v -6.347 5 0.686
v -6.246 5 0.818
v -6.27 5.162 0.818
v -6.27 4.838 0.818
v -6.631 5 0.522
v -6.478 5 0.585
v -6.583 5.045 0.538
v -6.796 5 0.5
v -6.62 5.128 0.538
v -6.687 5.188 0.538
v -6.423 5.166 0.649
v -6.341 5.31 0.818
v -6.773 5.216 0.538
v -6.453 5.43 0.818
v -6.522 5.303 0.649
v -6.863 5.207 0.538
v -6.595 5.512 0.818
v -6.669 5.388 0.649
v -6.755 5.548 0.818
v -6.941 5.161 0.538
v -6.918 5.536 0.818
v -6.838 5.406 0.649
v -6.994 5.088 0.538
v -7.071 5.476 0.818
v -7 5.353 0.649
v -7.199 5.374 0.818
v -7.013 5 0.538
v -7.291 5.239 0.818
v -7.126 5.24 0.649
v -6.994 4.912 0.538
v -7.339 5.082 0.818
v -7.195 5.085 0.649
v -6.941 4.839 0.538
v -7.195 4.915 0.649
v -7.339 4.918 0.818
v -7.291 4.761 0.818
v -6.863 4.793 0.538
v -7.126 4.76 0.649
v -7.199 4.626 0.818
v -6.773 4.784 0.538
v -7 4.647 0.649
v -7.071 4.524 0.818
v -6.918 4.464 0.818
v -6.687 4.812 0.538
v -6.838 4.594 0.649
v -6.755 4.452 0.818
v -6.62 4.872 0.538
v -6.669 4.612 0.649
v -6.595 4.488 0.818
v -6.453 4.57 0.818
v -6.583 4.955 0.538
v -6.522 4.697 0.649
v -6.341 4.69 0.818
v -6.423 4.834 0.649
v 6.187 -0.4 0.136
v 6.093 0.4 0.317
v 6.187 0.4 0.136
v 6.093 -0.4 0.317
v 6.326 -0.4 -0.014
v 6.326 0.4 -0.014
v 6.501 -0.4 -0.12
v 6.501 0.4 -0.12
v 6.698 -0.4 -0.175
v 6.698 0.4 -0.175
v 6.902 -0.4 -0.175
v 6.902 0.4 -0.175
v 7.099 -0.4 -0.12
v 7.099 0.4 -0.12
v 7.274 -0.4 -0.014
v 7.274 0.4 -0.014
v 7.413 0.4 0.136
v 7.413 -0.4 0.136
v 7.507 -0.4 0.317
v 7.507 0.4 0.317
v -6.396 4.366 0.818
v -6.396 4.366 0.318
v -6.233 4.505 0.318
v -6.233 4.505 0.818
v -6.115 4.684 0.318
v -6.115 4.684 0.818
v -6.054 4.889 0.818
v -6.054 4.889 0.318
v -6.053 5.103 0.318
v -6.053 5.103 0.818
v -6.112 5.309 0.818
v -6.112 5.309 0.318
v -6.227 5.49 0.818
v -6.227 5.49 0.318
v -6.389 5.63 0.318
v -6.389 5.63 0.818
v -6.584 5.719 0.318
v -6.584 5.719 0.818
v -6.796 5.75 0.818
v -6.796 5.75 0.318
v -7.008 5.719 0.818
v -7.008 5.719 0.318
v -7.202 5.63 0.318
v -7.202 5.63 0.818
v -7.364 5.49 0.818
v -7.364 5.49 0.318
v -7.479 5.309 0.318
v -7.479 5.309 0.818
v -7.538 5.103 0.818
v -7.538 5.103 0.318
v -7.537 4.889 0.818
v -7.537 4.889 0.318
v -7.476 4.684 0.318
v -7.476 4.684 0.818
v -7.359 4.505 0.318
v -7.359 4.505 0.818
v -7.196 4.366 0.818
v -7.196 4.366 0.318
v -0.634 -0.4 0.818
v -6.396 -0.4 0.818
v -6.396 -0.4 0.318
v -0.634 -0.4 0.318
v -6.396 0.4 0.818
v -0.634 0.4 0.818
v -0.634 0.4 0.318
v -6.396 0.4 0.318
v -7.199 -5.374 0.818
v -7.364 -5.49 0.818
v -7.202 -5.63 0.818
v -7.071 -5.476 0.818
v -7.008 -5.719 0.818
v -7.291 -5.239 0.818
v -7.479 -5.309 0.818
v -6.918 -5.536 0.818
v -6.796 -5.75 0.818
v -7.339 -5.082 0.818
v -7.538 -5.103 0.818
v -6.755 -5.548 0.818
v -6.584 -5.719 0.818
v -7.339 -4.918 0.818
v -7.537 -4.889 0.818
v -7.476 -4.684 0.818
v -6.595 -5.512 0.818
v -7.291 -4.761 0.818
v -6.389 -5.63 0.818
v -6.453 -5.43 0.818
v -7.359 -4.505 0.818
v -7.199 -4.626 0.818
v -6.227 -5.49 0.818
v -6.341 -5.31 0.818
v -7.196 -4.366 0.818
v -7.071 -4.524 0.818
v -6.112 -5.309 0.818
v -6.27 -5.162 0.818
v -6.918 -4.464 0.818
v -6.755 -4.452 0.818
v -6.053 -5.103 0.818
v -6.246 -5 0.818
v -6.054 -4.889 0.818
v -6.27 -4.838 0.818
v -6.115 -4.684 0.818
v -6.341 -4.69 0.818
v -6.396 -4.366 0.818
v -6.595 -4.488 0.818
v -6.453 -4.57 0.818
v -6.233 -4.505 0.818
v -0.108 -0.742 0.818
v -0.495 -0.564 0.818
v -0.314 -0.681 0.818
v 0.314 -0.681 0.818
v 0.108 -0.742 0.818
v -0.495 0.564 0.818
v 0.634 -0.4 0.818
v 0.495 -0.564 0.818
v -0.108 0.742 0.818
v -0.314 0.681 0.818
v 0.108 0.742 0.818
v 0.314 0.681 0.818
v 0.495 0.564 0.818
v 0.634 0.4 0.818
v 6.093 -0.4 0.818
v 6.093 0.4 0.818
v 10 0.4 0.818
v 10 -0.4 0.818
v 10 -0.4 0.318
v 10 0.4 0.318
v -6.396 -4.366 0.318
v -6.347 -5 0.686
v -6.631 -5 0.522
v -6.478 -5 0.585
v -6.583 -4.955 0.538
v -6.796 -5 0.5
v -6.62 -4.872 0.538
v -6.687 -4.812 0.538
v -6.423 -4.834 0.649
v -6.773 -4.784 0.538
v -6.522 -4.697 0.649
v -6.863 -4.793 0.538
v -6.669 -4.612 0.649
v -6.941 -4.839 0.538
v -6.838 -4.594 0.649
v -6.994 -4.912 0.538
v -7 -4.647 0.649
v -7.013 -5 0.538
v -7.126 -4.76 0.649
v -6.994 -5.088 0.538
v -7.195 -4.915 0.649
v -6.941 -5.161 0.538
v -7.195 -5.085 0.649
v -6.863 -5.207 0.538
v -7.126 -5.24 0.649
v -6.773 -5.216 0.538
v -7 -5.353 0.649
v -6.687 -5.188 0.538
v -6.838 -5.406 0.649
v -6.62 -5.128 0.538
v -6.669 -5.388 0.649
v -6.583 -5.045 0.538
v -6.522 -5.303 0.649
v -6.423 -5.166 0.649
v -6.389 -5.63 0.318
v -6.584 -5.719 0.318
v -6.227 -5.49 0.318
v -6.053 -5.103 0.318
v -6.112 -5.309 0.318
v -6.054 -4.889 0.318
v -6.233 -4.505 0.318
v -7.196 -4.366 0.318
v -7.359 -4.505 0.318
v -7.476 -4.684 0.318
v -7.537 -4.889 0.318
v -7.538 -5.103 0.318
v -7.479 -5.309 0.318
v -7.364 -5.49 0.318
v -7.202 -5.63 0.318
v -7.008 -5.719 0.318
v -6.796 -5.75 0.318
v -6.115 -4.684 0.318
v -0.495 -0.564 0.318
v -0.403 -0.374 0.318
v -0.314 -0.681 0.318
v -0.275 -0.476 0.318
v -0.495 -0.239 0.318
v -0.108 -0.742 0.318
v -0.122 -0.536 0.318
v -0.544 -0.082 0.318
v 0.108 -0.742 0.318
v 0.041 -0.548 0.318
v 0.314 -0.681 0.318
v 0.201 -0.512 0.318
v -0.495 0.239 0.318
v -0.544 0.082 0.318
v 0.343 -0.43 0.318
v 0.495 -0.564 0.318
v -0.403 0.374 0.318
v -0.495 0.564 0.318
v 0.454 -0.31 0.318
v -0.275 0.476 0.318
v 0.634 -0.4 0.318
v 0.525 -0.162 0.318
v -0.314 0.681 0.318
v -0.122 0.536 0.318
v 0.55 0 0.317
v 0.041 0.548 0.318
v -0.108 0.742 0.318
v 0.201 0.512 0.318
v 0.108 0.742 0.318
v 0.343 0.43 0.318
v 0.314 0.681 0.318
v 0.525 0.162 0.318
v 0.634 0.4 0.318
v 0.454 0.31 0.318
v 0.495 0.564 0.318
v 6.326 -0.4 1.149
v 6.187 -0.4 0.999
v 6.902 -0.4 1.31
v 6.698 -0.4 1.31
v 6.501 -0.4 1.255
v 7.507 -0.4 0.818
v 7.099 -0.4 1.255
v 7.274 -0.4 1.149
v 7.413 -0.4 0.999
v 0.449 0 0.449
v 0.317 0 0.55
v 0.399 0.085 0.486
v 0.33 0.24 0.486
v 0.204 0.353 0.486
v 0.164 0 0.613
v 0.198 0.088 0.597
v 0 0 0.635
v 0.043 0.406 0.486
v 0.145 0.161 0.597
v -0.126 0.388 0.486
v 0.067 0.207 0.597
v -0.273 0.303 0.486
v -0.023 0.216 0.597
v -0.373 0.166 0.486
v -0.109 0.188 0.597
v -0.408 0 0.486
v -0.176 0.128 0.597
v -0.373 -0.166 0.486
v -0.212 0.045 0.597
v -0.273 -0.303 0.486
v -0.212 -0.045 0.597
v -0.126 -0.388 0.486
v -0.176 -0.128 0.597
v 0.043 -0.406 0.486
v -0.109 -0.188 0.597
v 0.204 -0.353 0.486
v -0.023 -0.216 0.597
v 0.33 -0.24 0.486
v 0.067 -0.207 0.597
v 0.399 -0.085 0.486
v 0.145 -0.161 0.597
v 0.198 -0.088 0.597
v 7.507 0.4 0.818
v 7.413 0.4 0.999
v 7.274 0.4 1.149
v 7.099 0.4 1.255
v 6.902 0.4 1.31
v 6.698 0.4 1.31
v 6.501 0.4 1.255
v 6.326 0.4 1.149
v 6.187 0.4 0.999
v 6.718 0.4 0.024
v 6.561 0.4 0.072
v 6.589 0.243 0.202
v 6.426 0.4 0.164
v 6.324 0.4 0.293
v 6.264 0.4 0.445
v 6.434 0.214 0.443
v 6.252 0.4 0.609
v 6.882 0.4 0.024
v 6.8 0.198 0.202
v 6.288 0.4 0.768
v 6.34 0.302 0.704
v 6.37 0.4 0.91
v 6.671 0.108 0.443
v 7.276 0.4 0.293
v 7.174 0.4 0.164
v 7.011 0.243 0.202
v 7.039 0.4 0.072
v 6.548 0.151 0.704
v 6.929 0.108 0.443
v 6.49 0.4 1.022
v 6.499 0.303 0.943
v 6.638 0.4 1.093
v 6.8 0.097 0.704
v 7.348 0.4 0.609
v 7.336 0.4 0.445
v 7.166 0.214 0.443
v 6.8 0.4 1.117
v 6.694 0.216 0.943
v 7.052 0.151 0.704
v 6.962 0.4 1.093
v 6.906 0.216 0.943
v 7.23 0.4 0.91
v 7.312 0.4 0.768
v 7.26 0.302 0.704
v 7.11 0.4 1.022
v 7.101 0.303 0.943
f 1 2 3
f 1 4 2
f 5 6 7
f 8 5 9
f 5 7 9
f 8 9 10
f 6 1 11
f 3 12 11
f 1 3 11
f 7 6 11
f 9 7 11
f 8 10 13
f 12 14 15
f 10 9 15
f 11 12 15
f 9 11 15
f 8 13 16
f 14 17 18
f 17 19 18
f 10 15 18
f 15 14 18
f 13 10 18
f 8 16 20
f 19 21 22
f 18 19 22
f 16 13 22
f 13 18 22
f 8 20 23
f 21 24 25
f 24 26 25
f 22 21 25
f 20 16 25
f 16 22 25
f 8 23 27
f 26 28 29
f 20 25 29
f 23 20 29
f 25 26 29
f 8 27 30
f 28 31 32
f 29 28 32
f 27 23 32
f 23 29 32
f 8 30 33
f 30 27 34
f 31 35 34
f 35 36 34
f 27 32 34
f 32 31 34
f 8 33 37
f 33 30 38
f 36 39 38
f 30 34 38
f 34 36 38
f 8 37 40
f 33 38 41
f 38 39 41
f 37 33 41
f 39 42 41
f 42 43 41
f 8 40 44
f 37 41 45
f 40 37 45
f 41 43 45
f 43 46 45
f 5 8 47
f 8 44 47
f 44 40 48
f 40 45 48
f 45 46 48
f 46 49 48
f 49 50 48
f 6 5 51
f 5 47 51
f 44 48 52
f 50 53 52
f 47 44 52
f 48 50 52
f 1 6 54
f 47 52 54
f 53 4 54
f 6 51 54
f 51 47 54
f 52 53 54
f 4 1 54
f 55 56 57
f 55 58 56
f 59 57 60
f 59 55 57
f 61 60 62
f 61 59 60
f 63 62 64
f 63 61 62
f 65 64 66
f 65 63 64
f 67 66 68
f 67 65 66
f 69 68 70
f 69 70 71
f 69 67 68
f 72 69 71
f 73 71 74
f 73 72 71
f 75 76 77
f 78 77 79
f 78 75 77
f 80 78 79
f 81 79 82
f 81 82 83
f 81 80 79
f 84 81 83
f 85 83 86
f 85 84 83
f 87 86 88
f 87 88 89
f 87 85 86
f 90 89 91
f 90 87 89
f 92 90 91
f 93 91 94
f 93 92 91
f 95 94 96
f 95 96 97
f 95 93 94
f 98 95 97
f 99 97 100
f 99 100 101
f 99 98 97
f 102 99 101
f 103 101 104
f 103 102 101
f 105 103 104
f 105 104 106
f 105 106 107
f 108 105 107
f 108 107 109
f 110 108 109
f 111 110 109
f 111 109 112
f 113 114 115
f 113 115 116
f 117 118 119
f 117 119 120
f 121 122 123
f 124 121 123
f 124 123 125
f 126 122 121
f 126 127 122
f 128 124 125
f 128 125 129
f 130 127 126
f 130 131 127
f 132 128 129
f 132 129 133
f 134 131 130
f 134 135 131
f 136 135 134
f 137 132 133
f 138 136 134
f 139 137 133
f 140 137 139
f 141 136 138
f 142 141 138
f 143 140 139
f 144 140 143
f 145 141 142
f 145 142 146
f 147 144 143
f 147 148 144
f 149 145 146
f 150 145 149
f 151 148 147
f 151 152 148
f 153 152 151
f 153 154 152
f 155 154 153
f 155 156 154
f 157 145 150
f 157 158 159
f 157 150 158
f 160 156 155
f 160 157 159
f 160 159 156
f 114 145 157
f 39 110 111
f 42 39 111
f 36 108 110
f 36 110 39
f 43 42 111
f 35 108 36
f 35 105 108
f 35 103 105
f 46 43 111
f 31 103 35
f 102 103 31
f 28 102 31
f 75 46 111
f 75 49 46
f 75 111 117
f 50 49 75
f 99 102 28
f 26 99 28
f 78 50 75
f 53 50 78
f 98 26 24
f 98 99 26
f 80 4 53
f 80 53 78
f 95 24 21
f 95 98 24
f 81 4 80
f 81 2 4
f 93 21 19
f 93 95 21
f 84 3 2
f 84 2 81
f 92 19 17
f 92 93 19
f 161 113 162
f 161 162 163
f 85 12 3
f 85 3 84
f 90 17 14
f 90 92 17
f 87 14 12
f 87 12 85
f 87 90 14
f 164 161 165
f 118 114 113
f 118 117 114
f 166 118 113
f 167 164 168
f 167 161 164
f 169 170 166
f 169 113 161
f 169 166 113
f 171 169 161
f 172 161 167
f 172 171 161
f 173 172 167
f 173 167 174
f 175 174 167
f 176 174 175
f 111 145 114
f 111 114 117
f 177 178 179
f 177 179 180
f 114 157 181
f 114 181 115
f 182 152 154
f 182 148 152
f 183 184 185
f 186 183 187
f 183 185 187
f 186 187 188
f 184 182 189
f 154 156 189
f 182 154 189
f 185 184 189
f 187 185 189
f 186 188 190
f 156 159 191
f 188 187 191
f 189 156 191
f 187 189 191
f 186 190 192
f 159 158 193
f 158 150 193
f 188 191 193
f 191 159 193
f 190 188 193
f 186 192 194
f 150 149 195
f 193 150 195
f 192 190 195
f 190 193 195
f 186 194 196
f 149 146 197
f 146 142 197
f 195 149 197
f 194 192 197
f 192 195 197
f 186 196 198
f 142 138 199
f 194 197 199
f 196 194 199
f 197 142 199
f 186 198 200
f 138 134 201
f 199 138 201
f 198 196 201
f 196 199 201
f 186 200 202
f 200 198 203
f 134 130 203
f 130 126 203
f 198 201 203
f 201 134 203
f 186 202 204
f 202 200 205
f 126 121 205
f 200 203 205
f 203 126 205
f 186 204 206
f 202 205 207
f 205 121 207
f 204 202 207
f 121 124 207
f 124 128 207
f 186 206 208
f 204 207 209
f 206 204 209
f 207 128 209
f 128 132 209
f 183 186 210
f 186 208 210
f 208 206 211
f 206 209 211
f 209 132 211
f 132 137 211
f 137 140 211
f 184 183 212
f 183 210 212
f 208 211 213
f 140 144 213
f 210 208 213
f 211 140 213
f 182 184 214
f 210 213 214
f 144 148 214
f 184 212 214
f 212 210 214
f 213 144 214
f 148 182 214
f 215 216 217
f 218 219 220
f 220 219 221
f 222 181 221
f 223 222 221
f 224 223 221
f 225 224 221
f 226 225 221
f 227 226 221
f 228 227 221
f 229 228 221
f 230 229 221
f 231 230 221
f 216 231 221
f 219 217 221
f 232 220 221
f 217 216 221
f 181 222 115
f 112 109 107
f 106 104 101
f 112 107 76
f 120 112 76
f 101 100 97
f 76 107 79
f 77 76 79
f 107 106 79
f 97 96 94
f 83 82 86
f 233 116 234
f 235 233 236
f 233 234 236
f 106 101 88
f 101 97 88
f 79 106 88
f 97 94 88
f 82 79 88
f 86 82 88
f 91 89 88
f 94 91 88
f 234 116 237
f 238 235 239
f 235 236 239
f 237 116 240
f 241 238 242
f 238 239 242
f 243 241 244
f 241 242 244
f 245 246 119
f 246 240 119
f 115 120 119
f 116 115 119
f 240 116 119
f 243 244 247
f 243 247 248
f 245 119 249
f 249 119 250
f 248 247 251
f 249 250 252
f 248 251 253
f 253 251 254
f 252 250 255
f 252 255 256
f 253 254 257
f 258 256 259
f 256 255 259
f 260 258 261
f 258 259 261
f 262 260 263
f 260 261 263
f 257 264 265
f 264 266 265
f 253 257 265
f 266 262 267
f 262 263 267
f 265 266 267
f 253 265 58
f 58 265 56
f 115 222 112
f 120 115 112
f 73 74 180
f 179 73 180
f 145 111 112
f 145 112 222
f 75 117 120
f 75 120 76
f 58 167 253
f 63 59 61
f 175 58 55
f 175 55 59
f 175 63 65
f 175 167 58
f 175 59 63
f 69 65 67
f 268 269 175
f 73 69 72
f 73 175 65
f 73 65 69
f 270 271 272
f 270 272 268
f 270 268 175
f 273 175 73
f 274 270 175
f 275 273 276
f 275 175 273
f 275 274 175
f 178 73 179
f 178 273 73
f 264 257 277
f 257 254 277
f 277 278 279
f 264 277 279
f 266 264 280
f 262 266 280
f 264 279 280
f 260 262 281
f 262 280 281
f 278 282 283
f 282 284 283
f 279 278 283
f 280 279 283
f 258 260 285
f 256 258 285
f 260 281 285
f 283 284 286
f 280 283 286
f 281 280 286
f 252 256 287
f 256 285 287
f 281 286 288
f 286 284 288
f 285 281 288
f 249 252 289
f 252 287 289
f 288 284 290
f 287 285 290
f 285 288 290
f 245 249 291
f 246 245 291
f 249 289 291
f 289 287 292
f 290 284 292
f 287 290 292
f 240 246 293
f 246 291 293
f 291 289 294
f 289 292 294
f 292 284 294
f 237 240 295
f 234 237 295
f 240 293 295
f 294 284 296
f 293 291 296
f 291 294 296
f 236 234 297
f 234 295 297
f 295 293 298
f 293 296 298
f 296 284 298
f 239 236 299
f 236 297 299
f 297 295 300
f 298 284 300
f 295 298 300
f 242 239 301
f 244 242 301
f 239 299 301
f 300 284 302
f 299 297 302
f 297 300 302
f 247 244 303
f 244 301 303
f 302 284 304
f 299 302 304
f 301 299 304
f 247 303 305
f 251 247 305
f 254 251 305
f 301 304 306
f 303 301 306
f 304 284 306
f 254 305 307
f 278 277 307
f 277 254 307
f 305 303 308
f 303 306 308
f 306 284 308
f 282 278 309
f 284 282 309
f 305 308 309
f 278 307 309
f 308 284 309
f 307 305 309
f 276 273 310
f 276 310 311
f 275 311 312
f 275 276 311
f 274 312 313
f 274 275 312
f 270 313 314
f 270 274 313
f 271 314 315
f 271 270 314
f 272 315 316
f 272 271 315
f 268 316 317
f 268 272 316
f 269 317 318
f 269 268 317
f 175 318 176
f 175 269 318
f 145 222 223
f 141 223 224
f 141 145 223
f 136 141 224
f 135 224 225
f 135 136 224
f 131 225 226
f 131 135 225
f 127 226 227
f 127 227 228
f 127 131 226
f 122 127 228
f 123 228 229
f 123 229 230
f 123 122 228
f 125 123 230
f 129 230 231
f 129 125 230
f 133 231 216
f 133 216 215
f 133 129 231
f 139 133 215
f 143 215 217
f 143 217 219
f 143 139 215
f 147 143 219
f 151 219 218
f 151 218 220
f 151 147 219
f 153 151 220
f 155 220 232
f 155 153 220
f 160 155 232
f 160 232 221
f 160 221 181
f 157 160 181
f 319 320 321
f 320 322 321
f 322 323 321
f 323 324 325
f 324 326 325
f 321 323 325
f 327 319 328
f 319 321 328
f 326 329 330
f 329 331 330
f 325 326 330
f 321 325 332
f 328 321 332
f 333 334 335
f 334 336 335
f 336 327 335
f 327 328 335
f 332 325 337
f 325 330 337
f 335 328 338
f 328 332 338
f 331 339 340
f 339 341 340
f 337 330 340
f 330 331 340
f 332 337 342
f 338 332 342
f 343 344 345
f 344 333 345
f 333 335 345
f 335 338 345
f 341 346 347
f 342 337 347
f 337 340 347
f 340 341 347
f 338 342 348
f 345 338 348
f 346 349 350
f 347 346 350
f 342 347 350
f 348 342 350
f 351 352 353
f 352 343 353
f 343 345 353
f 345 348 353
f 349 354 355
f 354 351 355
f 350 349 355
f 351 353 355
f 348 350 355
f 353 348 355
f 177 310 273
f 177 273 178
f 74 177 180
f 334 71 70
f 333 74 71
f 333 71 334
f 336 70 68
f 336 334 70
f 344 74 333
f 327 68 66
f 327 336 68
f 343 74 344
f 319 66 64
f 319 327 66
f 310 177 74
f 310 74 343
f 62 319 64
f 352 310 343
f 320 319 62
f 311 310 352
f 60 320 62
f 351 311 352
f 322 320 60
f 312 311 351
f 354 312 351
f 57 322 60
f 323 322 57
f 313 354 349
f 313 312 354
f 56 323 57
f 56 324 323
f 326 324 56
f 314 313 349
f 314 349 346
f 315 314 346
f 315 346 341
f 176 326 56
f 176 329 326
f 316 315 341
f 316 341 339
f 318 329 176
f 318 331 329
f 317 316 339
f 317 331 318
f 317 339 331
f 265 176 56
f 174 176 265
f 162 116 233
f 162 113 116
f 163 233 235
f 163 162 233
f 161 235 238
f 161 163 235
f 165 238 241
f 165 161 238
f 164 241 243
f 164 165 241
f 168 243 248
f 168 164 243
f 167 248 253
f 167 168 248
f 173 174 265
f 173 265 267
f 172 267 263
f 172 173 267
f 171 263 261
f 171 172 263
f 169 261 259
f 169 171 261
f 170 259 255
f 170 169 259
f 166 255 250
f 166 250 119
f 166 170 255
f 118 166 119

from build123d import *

# Parameters (mm, degrees)
PAD_DEPTH    = 0.25
SKETCH001_R  = 0.75
PAD001_DEPTH = 0.25
SKETCH002_R  = 0.75
PAD002_DEPTH = 0.25
SKETCH003_R  = 0.75
PAD003_DEPTH = 0.25
SKETCH004_R  = 0.75
PAD004_DEPTH = 0.4


with BuildPart() as part:
    # Sketch (on DatumPlane) → Pad (new body, symmetric)
    with BuildSketch(Plane.XY.offset(0.5675)):
        Polygon((-7.195606, 5), (-7.195606, 0), (-7.195606, -5), (-6.795606, -5), (-6.395606, -5), (-6.395606, -0.4), (10, -0.4), (10, 0.4), (-6.395606, 0.4), (-6.395606, 5), (-6.795606, 5), align=None)
    extrude(amount=PAD_DEPTH, both=True)

    # Sketch001 (on DatumPlane) → Pad001 (join, symmetric)
    with BuildSketch(Plane.XY.offset(0.5675)):
        Circle(SKETCH001_R)
    extrude(amount=PAD001_DEPTH, both=True)

    # Sketch002 (on DatumPlane) → Pad002 (join, symmetric)
    with BuildSketch(Plane.XY.offset(0.5675)):
        with Locations((-6.795606, 5)):
            Circle(SKETCH002_R)
    extrude(amount=PAD002_DEPTH, both=True)

    # Sketch003 (on DatumPlane) → Pad003 (join, symmetric)
    with BuildSketch(Plane.XY.offset(0.5675)):
        with Locations((-6.795606, -5)):
            Circle(SKETCH003_R)
    extrude(amount=PAD003_DEPTH, both=True)

    # Sphere → Sphere (revolve, cut)
    with BuildSketch(Plane.XZ):
        with BuildLine():
            ThreePointArc((0, -0.635), (0.635, 0), (0, 0.635))
            Line((0, 0.635), (0, -0.635))
        make_face()
    revolve(axis=Axis((0, 0, 0), (0, 0, 1)), mode=Mode.SUBTRACT)

    # Sphere001 → Sphere001 (revolve, cut)
    with BuildSketch(Plane(origin=(-6.795606, 5, 1.135), x_dir=(1, 0, 0), z_dir=(0, -1, 0))):
        with BuildLine():
            ThreePointArc((0, -0.635), (0.635, 0), (0, 0.635))
            Line((0, 0.635), (0, -0.635))
        make_face()
    revolve(axis=Axis((-6.795606, 5, 1.135), (0, 0, 1)), mode=Mode.SUBTRACT)

    # Sphere002 → Sphere002 (revolve, cut)
    with BuildSketch(Plane(origin=(-6.795606, -5, 1.135), x_dir=(1, 0, 0), z_dir=(0, -1, 0))):
        with BuildLine():
            ThreePointArc((0, -0.635), (0.635, 0), (0, 0.635))
            Line((0, 0.635), (0, -0.635))
        make_face()
    revolve(axis=Axis((-6.795606, -5, 1.135), (0, 0, 1)), mode=Mode.SUBTRACT)

    # Sketch004 (on DatumPlane) → Pad004 (join, symmetric)
    with BuildSketch(Plane(origin=(0, 0, 0.5675), x_dir=(1, 0, 0), z_dir=(0, -1, 0))):
        with Locations((6.8, 0)):
            Circle(SKETCH004_R)
    extrude(amount=PAD004_DEPTH, both=True)

    # Sphere003 → Sphere003 (revolve, cut)
    with BuildSketch(Plane(origin=(6.8, 0.7175, 0.5675), x_dir=(1, 0, 0), z_dir=(0, -1, 0))):
        with BuildLine():
            ThreePointArc((0, -0.635), (0.635, 0), (0, 0.635))
            Line((0, 0.635), (0, -0.635))
        make_face()
    revolve(axis=Axis((6.8, 0.7175, 0.5675), (0, 0, 1)), mode=Mode.SUBTRACT)


solid = part.part
